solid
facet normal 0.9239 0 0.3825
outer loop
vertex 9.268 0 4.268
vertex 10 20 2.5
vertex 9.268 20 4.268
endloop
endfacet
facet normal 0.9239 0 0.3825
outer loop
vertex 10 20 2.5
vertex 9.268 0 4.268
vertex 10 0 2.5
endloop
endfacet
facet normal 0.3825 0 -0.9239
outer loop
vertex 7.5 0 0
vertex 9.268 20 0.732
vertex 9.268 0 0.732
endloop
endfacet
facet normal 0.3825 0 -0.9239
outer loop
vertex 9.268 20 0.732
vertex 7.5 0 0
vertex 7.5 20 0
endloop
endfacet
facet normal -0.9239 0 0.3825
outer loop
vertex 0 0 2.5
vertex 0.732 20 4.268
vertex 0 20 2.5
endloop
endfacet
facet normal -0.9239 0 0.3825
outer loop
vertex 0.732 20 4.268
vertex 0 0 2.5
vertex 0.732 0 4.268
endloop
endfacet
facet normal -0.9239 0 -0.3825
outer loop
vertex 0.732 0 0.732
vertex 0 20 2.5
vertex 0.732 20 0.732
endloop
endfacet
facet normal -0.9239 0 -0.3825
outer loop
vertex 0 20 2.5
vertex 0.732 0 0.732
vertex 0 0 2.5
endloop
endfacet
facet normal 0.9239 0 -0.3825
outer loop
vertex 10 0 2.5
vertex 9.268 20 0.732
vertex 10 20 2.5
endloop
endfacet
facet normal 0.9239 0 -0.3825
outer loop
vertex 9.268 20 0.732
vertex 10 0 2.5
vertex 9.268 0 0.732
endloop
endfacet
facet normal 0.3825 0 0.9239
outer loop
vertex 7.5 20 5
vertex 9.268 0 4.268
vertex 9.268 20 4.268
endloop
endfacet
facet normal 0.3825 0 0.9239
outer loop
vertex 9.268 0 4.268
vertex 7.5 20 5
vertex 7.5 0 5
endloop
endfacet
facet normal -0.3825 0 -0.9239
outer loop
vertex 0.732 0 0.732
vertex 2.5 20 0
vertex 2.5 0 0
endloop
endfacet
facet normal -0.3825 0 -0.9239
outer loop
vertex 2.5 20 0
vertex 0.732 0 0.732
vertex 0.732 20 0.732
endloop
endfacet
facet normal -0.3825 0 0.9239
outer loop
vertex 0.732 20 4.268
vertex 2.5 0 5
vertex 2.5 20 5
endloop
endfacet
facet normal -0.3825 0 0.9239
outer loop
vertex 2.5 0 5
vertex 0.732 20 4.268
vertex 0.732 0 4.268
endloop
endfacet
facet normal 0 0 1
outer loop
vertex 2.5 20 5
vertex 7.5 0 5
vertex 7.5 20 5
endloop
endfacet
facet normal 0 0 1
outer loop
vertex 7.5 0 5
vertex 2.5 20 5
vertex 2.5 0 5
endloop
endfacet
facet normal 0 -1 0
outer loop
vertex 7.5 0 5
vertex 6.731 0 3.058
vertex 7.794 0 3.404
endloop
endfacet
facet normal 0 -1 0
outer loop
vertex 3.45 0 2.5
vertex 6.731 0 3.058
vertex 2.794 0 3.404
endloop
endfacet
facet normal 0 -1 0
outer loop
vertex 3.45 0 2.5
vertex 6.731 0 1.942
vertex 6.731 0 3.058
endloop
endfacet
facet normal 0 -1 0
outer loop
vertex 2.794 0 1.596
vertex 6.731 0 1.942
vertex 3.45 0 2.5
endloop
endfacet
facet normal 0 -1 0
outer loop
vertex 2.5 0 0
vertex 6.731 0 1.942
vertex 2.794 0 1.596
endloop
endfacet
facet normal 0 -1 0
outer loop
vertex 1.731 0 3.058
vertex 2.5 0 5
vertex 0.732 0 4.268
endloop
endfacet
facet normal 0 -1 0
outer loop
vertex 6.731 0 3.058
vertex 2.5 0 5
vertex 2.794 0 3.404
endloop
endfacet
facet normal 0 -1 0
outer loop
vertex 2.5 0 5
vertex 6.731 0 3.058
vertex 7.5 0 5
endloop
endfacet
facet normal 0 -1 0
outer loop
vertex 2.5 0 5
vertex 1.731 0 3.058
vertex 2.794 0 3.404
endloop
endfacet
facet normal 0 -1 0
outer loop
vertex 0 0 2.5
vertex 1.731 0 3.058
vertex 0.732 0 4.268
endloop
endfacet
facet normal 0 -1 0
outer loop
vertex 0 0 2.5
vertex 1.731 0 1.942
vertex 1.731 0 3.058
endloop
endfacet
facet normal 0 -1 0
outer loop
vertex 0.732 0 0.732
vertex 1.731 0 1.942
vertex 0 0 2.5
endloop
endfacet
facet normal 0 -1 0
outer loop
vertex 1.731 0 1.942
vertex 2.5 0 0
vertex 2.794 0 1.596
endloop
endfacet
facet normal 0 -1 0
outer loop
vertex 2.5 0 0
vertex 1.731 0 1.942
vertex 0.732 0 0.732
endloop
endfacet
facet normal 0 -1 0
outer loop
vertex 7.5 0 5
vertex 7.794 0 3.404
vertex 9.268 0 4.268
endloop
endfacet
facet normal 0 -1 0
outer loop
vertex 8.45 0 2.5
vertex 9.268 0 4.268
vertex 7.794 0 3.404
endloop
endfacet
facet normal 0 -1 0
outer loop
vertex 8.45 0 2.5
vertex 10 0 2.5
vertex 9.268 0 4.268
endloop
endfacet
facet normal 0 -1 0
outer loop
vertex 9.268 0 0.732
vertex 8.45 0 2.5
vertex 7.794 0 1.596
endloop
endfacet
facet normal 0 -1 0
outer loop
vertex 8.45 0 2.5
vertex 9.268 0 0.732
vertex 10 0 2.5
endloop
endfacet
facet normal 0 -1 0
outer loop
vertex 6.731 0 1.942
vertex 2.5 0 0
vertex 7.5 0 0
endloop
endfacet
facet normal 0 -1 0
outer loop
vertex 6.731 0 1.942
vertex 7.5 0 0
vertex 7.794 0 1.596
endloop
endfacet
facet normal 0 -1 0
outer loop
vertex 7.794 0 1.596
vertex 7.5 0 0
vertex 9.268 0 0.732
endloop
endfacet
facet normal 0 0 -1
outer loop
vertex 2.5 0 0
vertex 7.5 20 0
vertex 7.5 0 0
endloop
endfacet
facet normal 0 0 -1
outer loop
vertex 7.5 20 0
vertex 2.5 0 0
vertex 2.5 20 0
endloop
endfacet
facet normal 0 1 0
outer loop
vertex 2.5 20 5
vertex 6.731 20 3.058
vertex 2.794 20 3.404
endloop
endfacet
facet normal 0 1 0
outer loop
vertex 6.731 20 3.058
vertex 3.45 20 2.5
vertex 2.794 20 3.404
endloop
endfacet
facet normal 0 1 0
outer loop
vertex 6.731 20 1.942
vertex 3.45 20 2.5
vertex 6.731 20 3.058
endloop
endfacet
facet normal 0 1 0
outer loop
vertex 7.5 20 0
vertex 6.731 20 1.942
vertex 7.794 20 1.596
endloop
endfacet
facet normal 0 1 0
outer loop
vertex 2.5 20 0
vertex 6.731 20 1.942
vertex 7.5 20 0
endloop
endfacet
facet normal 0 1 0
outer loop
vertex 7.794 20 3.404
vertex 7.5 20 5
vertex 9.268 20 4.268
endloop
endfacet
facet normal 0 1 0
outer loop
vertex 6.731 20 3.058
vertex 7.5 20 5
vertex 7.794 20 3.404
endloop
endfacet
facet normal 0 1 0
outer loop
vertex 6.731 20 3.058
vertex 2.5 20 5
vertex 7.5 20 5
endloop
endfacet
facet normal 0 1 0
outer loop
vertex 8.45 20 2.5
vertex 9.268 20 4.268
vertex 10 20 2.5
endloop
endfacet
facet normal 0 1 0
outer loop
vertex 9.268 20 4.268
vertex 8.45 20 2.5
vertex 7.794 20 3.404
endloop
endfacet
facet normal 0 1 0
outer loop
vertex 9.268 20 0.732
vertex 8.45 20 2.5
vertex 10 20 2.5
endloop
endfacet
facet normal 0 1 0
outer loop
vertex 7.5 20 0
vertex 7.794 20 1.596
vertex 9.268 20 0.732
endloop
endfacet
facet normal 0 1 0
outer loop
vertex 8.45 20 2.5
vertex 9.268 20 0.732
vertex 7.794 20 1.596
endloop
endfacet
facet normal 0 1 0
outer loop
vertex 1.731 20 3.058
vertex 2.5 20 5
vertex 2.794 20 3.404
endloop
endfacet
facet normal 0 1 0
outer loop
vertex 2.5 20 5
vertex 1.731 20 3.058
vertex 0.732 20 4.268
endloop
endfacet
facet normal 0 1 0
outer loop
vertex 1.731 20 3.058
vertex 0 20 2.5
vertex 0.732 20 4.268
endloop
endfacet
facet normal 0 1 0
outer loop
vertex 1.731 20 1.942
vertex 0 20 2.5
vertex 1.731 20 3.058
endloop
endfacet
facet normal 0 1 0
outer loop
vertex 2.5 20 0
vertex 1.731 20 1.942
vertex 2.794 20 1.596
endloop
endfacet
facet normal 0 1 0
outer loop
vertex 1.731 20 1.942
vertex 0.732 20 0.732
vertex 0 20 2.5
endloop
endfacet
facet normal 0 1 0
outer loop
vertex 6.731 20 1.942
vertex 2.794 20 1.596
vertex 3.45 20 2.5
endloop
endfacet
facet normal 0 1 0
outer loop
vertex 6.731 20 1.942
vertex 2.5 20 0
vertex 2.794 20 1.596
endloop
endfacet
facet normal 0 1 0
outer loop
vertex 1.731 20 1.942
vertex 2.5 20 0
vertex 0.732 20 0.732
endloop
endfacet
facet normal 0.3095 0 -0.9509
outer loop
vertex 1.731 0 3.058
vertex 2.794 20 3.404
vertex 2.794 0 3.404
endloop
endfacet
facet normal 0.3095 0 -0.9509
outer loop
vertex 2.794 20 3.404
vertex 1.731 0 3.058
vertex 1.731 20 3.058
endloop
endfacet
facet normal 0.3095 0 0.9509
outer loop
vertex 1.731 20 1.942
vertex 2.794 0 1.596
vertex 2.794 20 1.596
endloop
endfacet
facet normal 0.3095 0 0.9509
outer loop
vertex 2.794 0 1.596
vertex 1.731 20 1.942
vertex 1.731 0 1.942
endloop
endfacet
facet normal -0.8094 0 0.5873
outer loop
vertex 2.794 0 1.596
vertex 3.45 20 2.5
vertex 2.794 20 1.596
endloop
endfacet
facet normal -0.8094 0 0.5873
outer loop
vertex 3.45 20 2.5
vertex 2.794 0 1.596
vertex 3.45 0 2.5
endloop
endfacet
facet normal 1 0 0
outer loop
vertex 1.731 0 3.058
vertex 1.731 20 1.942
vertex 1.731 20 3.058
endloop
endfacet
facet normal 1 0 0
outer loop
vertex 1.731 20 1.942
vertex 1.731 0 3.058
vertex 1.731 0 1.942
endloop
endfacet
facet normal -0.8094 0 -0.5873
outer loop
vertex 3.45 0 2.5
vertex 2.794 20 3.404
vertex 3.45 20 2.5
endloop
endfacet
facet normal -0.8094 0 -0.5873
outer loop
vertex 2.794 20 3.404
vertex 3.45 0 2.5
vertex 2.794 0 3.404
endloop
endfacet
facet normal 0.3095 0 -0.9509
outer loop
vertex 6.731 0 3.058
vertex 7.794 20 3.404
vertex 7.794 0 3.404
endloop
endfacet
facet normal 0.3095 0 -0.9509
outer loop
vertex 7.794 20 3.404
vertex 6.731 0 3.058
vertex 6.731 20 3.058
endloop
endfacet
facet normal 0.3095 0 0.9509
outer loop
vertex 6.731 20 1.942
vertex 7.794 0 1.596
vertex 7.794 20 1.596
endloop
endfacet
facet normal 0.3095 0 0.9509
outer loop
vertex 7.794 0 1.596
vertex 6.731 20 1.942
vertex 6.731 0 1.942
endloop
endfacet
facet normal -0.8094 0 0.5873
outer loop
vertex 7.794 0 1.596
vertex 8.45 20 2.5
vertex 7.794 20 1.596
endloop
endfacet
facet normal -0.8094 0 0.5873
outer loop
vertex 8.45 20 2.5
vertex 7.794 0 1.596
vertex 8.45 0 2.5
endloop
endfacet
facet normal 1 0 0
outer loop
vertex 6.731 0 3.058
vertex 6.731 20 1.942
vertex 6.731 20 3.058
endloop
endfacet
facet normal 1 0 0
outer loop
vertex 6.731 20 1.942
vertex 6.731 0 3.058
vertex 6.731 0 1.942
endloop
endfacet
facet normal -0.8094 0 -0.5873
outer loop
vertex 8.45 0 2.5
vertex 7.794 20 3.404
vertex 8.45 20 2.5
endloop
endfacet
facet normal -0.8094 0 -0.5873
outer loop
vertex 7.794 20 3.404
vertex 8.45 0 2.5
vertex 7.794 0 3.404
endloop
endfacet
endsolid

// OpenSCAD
//midScreen();
//endScreen();
hinge();

/* BEGIN CODE */


width=148;
height=210;
thickness=5;
hingeHeight=20;
filamentLength=hingeHeight+thickness*4;
filamentD=1.9;

module filament() {
    rotate([-90,0,0])
    translate([thickness*0.5,-thickness*0.5,0])
    cylinder(d=filamentD, h=filamentLength);
}

module screen() {
    difference() {
        cube([width,height,thickness]);
        
        translate([thickness,thickness,thickness/2])
        cube([width-thickness*2,height-thickness*2,thickness]);
    }
}

module hinge() {
    difference() {
        rotate([-90,0,0])
        translate([0,-thickness,0])
        hull() {
            translate([thickness/2,thickness/2,0])
                cylinder(h=hingeHeight, d=thickness);
            
            
            translate([thickness*1.5,thickness/2,0])
                cylinder(h=hingeHeight, d=thickness);
        }
        
        filament();
        
        translate([thickness,0,0])
        filament();
    }
}

module hingeGap() {
    cube([thickness*2, hingeHeight, thickness]);
}

module doubleHingeGap() {
    translate([-thickness,thickness*2,0])
    hingeGap();

    translate([-thickness,height-thickness*2-hingeHeight,0])
    hingeGap();
}

module doubleFilamentGap() {
    filament();
    
    translate([0,height-filamentLength,0])
    filament();
}

module endScreen() {
    difference() {
        screen();
        
        doubleHingeGap();
        
        doubleFilamentGap();
    }
}

module midScreen() {
    difference() {
        screen();
 
        doubleHingeGap();
        
        translate([width,0,0])
        doubleHingeGap();

        doubleFilamentGap();
        
        translate([width-thickness,0,0])
        doubleFilamentGap();
    }
}
